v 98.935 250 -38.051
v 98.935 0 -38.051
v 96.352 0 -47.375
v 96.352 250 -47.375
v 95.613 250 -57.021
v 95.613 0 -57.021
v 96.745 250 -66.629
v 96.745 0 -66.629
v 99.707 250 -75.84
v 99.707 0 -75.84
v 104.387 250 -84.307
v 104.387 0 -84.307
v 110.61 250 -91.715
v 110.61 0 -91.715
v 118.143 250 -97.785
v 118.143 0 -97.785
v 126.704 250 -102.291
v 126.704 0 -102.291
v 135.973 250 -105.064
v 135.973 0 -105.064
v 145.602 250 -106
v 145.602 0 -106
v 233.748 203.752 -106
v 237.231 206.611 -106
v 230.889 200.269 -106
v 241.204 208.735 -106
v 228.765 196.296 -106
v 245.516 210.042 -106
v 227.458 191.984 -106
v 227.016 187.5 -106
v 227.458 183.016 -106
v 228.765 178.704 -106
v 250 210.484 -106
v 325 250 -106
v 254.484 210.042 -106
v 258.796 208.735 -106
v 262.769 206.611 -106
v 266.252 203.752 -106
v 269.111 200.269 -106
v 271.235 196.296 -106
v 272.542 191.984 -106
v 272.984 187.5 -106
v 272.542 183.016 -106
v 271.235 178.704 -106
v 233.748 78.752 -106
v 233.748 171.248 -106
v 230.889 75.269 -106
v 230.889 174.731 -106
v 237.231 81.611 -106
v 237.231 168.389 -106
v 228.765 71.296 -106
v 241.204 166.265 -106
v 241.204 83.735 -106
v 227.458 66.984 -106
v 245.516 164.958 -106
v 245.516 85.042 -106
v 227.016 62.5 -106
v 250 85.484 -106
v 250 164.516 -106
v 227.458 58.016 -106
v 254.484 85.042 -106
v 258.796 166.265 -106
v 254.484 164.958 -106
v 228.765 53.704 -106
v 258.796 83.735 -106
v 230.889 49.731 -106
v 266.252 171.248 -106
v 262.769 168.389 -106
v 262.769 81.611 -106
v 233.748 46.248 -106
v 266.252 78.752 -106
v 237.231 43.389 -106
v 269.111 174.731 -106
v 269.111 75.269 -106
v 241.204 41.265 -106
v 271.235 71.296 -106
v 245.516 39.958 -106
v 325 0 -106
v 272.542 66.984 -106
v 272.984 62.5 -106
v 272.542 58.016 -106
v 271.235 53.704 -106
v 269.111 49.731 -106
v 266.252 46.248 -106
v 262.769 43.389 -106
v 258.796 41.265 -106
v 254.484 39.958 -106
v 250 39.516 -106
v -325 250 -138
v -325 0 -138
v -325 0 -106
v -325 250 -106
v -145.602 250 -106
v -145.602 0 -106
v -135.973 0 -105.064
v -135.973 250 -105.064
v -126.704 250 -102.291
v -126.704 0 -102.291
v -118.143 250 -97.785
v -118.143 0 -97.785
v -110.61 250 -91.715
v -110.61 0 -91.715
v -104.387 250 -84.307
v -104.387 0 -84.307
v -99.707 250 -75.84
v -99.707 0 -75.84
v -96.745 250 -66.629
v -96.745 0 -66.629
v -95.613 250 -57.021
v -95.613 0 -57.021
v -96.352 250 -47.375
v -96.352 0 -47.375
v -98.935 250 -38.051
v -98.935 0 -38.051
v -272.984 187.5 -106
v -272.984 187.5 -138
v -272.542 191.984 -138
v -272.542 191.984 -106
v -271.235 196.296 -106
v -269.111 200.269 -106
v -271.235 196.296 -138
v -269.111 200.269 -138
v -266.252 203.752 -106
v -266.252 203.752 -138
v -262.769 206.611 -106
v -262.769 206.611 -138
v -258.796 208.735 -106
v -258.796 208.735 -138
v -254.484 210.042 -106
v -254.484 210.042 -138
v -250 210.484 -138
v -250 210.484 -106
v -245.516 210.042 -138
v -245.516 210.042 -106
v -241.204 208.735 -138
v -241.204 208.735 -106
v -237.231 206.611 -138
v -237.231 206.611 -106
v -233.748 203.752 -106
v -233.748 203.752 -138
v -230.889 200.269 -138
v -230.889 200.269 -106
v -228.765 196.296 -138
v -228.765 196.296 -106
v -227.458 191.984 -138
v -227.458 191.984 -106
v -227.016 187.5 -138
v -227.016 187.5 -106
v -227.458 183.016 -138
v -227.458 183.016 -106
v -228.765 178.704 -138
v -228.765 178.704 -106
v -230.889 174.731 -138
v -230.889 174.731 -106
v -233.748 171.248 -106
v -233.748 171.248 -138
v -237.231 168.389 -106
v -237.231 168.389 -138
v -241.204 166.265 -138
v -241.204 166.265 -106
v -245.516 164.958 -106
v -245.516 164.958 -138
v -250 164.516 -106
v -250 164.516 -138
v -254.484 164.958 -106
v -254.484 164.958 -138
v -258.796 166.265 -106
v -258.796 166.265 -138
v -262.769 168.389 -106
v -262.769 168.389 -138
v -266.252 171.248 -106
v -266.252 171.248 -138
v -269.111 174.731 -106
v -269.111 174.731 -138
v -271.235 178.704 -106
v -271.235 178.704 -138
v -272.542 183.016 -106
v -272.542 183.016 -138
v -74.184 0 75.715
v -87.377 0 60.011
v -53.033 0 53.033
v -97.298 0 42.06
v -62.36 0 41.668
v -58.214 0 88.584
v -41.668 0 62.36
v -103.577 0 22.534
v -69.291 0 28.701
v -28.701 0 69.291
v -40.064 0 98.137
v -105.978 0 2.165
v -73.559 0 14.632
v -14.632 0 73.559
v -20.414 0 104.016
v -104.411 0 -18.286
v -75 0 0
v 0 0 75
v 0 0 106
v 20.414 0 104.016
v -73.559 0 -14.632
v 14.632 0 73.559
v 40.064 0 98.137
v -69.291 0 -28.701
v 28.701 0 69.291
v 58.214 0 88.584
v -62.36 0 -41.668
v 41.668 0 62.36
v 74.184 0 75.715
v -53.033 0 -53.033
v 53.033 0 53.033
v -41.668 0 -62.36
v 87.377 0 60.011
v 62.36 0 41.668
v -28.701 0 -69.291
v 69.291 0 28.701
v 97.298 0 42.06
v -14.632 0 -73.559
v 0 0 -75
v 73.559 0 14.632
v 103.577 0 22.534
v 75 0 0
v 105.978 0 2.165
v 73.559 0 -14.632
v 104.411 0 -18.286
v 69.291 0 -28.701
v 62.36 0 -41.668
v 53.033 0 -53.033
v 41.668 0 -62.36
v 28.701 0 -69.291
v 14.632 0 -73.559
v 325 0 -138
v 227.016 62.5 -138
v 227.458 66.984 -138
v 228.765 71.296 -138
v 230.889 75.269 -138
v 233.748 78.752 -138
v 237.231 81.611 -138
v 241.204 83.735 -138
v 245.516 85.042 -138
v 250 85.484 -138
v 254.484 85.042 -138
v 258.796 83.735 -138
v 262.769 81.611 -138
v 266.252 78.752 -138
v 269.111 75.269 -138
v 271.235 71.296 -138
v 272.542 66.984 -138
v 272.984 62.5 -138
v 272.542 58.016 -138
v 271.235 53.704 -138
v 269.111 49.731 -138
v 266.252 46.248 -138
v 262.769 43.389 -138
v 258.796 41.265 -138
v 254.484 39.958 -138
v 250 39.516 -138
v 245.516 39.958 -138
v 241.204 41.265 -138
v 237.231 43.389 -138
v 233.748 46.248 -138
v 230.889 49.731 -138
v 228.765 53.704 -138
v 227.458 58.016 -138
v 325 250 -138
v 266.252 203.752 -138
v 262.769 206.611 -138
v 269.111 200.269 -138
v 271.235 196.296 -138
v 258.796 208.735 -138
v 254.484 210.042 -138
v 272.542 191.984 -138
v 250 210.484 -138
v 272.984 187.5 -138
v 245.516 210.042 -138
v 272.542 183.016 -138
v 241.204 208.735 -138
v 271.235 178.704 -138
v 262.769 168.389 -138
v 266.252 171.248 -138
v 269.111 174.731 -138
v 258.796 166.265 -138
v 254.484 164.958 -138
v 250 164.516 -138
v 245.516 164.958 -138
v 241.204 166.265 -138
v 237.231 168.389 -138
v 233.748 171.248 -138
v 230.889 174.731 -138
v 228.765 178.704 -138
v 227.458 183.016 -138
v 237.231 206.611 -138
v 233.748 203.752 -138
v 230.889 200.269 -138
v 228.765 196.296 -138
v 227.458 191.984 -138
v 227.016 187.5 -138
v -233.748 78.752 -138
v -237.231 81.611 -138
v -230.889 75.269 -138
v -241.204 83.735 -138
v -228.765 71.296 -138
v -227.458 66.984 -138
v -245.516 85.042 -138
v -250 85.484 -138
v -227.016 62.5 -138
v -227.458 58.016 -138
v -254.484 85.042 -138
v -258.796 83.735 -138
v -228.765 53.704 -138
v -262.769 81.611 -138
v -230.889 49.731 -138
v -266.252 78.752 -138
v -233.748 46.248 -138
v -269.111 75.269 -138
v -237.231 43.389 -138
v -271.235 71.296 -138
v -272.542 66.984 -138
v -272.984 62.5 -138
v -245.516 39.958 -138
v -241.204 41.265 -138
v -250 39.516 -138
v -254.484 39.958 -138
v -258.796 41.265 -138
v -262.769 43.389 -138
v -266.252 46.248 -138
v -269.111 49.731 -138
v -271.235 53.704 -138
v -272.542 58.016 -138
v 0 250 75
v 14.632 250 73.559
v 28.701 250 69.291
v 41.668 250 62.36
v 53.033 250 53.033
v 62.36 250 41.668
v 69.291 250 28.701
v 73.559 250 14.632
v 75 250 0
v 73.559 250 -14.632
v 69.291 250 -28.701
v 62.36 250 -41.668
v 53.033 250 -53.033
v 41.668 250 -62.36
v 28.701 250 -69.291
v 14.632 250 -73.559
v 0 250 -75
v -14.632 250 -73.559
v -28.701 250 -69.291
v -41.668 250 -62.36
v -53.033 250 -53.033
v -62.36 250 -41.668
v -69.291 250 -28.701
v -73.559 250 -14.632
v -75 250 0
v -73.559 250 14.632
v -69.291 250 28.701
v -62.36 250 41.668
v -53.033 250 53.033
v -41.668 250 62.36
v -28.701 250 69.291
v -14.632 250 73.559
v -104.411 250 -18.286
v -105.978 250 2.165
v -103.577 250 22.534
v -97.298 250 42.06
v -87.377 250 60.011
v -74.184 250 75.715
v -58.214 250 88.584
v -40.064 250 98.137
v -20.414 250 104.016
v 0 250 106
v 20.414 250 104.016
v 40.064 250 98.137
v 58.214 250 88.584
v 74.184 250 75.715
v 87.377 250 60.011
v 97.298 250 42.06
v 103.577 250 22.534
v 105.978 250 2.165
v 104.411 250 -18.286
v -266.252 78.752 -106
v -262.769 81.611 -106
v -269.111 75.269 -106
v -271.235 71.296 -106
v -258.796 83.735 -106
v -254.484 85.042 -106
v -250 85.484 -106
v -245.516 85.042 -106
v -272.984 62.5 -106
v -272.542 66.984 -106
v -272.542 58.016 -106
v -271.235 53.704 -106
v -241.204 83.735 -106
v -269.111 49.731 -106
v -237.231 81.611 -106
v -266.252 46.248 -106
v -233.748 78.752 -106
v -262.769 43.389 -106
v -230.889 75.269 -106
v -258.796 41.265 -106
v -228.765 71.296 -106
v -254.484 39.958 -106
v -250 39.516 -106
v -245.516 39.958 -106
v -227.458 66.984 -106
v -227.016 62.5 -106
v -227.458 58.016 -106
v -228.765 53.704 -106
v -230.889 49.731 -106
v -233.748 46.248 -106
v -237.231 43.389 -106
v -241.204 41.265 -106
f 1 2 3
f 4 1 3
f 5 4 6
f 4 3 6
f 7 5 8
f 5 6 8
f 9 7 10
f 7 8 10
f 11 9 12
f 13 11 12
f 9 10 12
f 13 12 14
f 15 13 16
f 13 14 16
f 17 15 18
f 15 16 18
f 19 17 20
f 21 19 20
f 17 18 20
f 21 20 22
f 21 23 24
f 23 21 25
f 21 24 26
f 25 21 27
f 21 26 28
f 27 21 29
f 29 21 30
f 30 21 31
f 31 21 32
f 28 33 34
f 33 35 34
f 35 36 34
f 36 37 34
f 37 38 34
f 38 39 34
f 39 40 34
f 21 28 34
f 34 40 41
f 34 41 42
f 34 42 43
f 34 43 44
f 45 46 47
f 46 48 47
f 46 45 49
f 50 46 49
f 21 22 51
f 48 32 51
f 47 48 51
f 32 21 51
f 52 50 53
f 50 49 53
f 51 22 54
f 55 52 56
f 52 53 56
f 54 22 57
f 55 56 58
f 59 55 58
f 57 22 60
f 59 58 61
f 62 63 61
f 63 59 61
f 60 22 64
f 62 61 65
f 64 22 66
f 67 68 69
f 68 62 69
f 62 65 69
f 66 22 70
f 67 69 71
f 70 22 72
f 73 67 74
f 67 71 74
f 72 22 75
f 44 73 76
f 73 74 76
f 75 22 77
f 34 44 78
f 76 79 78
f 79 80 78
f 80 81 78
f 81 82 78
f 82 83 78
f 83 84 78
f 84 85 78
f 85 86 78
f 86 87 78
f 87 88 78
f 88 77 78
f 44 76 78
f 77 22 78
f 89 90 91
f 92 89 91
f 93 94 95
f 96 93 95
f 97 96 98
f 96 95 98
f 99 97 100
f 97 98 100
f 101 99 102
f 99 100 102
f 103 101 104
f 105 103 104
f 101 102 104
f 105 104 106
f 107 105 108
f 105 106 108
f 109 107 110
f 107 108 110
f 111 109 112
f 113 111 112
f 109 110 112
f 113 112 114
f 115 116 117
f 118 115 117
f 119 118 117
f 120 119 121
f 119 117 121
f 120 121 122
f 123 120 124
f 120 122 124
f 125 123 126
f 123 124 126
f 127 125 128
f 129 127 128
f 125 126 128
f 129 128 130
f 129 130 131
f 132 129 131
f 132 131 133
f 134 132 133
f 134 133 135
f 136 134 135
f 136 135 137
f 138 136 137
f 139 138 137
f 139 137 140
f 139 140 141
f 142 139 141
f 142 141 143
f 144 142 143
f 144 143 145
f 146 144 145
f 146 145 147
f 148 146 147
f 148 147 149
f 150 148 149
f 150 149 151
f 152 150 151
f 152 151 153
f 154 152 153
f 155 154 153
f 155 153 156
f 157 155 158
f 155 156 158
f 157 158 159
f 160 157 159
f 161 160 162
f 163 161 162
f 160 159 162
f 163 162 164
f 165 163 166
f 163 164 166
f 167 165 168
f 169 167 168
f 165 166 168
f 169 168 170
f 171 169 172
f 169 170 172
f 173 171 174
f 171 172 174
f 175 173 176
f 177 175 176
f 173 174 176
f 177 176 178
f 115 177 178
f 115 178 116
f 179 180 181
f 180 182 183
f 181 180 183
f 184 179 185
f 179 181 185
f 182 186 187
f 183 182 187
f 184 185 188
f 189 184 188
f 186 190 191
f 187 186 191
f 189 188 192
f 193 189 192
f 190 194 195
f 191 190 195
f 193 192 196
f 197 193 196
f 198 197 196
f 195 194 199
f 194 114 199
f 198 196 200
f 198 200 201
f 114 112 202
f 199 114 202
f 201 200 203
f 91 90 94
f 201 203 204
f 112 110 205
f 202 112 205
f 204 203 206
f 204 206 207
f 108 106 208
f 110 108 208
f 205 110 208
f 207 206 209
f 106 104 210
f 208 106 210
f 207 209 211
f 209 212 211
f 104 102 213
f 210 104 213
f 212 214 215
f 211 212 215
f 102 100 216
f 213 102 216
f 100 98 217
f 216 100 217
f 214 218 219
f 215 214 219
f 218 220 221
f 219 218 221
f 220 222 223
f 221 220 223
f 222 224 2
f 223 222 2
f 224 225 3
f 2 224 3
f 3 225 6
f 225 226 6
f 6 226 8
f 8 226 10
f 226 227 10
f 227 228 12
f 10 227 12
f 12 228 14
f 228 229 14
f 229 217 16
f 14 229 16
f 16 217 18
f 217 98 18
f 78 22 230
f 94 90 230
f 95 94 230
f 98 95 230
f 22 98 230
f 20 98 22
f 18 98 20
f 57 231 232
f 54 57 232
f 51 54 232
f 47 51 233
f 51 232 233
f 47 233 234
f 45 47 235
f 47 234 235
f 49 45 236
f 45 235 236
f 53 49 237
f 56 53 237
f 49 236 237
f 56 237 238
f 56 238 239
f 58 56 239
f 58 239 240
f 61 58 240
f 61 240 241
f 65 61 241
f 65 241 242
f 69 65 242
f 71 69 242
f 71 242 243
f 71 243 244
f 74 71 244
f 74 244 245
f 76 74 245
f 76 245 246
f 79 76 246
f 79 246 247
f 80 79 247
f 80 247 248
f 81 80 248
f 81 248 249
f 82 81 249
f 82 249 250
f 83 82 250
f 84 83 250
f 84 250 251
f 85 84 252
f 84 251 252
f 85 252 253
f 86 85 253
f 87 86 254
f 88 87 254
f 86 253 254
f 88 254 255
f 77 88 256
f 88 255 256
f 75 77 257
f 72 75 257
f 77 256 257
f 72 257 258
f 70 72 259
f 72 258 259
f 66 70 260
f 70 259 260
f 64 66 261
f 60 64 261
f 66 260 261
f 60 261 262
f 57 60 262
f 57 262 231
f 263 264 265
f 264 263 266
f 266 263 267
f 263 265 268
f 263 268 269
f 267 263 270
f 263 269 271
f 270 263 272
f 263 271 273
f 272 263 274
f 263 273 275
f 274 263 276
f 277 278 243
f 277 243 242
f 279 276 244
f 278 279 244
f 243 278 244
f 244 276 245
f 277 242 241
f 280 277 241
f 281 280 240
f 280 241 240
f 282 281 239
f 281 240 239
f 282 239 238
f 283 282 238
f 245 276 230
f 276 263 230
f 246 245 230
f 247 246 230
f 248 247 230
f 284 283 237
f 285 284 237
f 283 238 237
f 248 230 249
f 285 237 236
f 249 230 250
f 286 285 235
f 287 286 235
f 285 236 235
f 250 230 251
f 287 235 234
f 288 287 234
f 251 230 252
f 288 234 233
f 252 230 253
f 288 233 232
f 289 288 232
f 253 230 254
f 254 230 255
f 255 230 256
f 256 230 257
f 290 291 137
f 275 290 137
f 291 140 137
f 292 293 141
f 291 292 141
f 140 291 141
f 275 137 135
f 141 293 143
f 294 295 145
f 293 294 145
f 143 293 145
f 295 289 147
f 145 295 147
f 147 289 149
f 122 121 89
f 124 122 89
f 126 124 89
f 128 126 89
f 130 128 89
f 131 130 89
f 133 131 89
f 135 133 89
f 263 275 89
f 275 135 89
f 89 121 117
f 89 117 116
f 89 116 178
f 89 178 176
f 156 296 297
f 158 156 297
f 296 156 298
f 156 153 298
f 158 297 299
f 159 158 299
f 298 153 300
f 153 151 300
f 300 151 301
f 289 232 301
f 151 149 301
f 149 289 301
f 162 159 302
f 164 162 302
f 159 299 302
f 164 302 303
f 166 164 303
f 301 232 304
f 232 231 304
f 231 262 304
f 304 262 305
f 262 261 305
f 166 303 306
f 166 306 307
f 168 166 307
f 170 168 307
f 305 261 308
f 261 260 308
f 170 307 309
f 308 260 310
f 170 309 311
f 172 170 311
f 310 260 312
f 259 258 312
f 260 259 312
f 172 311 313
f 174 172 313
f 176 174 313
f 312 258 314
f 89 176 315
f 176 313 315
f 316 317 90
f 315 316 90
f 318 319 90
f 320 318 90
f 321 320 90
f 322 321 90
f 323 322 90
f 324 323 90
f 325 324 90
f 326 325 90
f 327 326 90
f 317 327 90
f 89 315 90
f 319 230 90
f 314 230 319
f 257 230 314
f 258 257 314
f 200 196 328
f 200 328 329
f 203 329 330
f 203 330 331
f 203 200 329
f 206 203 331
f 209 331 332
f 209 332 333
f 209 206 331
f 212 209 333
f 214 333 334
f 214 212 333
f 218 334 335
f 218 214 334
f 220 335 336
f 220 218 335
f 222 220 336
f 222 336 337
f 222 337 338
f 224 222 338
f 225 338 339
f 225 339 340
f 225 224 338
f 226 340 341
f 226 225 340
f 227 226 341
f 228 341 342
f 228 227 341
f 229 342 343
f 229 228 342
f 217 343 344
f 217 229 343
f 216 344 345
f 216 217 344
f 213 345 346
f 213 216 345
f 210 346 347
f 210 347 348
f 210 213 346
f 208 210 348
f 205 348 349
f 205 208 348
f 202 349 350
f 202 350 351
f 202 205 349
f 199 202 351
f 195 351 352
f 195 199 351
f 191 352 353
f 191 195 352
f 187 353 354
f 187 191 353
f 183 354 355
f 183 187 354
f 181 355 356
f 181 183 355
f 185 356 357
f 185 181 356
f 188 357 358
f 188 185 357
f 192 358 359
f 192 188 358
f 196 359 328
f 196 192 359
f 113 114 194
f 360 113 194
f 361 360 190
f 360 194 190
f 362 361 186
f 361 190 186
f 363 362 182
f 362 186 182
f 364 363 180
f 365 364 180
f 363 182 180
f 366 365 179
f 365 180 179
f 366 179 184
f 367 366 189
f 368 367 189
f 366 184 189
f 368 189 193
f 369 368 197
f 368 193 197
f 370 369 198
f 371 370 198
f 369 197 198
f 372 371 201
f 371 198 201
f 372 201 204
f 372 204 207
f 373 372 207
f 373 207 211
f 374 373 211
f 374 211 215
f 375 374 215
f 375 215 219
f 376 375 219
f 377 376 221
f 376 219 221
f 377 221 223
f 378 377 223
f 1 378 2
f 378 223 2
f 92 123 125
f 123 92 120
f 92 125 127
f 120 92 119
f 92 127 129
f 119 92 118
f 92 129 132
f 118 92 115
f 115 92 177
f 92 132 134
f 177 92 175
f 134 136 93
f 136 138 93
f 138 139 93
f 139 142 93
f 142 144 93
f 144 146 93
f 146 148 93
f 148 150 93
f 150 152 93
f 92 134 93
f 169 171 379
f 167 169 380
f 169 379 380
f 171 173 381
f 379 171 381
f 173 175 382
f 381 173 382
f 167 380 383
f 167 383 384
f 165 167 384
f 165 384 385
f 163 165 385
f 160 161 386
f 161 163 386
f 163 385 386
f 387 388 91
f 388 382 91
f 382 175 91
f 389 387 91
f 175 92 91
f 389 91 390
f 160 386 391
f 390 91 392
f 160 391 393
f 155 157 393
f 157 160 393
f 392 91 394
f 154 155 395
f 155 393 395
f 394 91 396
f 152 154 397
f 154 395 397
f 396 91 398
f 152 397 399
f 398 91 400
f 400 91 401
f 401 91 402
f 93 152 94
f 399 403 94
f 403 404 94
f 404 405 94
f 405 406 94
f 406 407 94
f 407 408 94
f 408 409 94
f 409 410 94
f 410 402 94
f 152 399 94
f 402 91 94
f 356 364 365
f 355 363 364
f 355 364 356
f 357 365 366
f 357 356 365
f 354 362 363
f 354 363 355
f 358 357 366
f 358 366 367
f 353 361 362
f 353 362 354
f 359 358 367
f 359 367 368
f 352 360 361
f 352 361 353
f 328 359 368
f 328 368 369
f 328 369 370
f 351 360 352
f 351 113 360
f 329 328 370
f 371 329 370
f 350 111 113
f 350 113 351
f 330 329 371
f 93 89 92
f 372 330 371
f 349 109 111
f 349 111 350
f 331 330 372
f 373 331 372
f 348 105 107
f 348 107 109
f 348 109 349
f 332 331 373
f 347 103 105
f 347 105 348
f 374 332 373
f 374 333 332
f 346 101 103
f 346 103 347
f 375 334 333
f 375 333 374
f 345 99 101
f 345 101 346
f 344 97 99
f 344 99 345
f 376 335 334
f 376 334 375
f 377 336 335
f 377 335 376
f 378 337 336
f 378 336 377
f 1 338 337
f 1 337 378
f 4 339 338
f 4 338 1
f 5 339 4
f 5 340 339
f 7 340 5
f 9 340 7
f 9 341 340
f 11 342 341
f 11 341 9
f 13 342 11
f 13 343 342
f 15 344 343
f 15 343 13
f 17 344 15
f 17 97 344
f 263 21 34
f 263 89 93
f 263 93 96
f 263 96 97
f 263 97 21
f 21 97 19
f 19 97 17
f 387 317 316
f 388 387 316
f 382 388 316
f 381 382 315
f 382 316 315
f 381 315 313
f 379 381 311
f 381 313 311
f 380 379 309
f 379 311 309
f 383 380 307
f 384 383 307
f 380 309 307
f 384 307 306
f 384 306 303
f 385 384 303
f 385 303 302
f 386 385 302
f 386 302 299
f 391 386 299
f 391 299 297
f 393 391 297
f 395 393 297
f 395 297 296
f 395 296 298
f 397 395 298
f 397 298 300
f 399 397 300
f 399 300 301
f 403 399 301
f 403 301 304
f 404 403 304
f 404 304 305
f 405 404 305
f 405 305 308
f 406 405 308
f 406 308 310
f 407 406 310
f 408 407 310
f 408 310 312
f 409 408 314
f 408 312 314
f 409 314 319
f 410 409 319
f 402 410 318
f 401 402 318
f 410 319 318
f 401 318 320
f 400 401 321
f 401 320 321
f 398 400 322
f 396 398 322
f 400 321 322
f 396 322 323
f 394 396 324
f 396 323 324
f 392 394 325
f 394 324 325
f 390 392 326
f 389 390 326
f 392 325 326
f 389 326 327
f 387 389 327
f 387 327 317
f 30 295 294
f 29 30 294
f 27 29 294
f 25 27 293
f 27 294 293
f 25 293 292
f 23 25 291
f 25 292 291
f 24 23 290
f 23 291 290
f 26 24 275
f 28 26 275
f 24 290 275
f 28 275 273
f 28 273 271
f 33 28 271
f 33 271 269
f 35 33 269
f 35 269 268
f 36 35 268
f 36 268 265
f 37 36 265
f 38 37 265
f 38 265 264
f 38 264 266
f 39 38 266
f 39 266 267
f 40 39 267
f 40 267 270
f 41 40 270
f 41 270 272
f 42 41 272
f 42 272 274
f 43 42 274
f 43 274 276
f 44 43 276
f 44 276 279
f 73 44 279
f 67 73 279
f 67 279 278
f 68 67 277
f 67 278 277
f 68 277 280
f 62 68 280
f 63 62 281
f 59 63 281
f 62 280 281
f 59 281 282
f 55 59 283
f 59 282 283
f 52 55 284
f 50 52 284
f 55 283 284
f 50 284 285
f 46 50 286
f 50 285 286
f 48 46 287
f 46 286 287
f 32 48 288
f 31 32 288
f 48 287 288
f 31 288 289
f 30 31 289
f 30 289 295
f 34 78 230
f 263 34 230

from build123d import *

# Parameters (mm, degrees)
SKETCH3_R           = 75
BOSS_EXTRUDE1_DEPTH = 250
SKETCH4_R           = 22.984114262
CUT_EXTRUDE1_DEPTH  = 478.138344718


with BuildPart() as part:
    # Sketch3 → Boss-Extrude1 (new body)
    with BuildSketch(Plane(origin=(0, 0, 0), x_dir=(1, 0, 0), z_dir=(0, 1, 0))):
        with BuildLine():
            Line((-325, 138), (-325, 106))
            Line((-325, 106), (-145.602197786, 106))
            ThreePointArc((-145.602197786, 106), (-104.386691617, 84.306925854), (-98.9348267, 38.051282051))
            ThreePointArc((-98.9348267, 38.051282051), (0, -106), (98.9348267, 38.051282051))
            ThreePointArc((98.9348267, 38.051282051), (104.386691617, 84.306925854), (145.602197786, 106))
            Line((145.602197786, 106), (325, 106))
            Line((325, 106), (325, 138))
            Line((325, 138), (-325, 138))
        make_face()
        with Locations(Location((0, 0, 0), (0, 0, 270))):
            Circle(SKETCH3_R, mode=Mode.SUBTRACT)
    extrude(amount=BOSS_EXTRUDE1_DEPTH)

    # Sketch4 → Cut-Extrude1 (cut, through all)
    with BuildSketch(Plane(origin=(0, 0, -138), x_dir=(-1, 0, 0), z_dir=(0, 0, -1))):
        with Locations((-250, 187.5)):
            Circle(SKETCH4_R)
        with Locations((250, 187.5)):
            Circle(SKETCH4_R)
        with Locations((250, 62.5)):
            Circle(SKETCH4_R)
        with Locations((-250, 62.5)):
            Circle(SKETCH4_R)
    extrude(amount=-CUT_EXTRUDE1_DEPTH, mode=Mode.SUBTRACT)


solid = part.part
